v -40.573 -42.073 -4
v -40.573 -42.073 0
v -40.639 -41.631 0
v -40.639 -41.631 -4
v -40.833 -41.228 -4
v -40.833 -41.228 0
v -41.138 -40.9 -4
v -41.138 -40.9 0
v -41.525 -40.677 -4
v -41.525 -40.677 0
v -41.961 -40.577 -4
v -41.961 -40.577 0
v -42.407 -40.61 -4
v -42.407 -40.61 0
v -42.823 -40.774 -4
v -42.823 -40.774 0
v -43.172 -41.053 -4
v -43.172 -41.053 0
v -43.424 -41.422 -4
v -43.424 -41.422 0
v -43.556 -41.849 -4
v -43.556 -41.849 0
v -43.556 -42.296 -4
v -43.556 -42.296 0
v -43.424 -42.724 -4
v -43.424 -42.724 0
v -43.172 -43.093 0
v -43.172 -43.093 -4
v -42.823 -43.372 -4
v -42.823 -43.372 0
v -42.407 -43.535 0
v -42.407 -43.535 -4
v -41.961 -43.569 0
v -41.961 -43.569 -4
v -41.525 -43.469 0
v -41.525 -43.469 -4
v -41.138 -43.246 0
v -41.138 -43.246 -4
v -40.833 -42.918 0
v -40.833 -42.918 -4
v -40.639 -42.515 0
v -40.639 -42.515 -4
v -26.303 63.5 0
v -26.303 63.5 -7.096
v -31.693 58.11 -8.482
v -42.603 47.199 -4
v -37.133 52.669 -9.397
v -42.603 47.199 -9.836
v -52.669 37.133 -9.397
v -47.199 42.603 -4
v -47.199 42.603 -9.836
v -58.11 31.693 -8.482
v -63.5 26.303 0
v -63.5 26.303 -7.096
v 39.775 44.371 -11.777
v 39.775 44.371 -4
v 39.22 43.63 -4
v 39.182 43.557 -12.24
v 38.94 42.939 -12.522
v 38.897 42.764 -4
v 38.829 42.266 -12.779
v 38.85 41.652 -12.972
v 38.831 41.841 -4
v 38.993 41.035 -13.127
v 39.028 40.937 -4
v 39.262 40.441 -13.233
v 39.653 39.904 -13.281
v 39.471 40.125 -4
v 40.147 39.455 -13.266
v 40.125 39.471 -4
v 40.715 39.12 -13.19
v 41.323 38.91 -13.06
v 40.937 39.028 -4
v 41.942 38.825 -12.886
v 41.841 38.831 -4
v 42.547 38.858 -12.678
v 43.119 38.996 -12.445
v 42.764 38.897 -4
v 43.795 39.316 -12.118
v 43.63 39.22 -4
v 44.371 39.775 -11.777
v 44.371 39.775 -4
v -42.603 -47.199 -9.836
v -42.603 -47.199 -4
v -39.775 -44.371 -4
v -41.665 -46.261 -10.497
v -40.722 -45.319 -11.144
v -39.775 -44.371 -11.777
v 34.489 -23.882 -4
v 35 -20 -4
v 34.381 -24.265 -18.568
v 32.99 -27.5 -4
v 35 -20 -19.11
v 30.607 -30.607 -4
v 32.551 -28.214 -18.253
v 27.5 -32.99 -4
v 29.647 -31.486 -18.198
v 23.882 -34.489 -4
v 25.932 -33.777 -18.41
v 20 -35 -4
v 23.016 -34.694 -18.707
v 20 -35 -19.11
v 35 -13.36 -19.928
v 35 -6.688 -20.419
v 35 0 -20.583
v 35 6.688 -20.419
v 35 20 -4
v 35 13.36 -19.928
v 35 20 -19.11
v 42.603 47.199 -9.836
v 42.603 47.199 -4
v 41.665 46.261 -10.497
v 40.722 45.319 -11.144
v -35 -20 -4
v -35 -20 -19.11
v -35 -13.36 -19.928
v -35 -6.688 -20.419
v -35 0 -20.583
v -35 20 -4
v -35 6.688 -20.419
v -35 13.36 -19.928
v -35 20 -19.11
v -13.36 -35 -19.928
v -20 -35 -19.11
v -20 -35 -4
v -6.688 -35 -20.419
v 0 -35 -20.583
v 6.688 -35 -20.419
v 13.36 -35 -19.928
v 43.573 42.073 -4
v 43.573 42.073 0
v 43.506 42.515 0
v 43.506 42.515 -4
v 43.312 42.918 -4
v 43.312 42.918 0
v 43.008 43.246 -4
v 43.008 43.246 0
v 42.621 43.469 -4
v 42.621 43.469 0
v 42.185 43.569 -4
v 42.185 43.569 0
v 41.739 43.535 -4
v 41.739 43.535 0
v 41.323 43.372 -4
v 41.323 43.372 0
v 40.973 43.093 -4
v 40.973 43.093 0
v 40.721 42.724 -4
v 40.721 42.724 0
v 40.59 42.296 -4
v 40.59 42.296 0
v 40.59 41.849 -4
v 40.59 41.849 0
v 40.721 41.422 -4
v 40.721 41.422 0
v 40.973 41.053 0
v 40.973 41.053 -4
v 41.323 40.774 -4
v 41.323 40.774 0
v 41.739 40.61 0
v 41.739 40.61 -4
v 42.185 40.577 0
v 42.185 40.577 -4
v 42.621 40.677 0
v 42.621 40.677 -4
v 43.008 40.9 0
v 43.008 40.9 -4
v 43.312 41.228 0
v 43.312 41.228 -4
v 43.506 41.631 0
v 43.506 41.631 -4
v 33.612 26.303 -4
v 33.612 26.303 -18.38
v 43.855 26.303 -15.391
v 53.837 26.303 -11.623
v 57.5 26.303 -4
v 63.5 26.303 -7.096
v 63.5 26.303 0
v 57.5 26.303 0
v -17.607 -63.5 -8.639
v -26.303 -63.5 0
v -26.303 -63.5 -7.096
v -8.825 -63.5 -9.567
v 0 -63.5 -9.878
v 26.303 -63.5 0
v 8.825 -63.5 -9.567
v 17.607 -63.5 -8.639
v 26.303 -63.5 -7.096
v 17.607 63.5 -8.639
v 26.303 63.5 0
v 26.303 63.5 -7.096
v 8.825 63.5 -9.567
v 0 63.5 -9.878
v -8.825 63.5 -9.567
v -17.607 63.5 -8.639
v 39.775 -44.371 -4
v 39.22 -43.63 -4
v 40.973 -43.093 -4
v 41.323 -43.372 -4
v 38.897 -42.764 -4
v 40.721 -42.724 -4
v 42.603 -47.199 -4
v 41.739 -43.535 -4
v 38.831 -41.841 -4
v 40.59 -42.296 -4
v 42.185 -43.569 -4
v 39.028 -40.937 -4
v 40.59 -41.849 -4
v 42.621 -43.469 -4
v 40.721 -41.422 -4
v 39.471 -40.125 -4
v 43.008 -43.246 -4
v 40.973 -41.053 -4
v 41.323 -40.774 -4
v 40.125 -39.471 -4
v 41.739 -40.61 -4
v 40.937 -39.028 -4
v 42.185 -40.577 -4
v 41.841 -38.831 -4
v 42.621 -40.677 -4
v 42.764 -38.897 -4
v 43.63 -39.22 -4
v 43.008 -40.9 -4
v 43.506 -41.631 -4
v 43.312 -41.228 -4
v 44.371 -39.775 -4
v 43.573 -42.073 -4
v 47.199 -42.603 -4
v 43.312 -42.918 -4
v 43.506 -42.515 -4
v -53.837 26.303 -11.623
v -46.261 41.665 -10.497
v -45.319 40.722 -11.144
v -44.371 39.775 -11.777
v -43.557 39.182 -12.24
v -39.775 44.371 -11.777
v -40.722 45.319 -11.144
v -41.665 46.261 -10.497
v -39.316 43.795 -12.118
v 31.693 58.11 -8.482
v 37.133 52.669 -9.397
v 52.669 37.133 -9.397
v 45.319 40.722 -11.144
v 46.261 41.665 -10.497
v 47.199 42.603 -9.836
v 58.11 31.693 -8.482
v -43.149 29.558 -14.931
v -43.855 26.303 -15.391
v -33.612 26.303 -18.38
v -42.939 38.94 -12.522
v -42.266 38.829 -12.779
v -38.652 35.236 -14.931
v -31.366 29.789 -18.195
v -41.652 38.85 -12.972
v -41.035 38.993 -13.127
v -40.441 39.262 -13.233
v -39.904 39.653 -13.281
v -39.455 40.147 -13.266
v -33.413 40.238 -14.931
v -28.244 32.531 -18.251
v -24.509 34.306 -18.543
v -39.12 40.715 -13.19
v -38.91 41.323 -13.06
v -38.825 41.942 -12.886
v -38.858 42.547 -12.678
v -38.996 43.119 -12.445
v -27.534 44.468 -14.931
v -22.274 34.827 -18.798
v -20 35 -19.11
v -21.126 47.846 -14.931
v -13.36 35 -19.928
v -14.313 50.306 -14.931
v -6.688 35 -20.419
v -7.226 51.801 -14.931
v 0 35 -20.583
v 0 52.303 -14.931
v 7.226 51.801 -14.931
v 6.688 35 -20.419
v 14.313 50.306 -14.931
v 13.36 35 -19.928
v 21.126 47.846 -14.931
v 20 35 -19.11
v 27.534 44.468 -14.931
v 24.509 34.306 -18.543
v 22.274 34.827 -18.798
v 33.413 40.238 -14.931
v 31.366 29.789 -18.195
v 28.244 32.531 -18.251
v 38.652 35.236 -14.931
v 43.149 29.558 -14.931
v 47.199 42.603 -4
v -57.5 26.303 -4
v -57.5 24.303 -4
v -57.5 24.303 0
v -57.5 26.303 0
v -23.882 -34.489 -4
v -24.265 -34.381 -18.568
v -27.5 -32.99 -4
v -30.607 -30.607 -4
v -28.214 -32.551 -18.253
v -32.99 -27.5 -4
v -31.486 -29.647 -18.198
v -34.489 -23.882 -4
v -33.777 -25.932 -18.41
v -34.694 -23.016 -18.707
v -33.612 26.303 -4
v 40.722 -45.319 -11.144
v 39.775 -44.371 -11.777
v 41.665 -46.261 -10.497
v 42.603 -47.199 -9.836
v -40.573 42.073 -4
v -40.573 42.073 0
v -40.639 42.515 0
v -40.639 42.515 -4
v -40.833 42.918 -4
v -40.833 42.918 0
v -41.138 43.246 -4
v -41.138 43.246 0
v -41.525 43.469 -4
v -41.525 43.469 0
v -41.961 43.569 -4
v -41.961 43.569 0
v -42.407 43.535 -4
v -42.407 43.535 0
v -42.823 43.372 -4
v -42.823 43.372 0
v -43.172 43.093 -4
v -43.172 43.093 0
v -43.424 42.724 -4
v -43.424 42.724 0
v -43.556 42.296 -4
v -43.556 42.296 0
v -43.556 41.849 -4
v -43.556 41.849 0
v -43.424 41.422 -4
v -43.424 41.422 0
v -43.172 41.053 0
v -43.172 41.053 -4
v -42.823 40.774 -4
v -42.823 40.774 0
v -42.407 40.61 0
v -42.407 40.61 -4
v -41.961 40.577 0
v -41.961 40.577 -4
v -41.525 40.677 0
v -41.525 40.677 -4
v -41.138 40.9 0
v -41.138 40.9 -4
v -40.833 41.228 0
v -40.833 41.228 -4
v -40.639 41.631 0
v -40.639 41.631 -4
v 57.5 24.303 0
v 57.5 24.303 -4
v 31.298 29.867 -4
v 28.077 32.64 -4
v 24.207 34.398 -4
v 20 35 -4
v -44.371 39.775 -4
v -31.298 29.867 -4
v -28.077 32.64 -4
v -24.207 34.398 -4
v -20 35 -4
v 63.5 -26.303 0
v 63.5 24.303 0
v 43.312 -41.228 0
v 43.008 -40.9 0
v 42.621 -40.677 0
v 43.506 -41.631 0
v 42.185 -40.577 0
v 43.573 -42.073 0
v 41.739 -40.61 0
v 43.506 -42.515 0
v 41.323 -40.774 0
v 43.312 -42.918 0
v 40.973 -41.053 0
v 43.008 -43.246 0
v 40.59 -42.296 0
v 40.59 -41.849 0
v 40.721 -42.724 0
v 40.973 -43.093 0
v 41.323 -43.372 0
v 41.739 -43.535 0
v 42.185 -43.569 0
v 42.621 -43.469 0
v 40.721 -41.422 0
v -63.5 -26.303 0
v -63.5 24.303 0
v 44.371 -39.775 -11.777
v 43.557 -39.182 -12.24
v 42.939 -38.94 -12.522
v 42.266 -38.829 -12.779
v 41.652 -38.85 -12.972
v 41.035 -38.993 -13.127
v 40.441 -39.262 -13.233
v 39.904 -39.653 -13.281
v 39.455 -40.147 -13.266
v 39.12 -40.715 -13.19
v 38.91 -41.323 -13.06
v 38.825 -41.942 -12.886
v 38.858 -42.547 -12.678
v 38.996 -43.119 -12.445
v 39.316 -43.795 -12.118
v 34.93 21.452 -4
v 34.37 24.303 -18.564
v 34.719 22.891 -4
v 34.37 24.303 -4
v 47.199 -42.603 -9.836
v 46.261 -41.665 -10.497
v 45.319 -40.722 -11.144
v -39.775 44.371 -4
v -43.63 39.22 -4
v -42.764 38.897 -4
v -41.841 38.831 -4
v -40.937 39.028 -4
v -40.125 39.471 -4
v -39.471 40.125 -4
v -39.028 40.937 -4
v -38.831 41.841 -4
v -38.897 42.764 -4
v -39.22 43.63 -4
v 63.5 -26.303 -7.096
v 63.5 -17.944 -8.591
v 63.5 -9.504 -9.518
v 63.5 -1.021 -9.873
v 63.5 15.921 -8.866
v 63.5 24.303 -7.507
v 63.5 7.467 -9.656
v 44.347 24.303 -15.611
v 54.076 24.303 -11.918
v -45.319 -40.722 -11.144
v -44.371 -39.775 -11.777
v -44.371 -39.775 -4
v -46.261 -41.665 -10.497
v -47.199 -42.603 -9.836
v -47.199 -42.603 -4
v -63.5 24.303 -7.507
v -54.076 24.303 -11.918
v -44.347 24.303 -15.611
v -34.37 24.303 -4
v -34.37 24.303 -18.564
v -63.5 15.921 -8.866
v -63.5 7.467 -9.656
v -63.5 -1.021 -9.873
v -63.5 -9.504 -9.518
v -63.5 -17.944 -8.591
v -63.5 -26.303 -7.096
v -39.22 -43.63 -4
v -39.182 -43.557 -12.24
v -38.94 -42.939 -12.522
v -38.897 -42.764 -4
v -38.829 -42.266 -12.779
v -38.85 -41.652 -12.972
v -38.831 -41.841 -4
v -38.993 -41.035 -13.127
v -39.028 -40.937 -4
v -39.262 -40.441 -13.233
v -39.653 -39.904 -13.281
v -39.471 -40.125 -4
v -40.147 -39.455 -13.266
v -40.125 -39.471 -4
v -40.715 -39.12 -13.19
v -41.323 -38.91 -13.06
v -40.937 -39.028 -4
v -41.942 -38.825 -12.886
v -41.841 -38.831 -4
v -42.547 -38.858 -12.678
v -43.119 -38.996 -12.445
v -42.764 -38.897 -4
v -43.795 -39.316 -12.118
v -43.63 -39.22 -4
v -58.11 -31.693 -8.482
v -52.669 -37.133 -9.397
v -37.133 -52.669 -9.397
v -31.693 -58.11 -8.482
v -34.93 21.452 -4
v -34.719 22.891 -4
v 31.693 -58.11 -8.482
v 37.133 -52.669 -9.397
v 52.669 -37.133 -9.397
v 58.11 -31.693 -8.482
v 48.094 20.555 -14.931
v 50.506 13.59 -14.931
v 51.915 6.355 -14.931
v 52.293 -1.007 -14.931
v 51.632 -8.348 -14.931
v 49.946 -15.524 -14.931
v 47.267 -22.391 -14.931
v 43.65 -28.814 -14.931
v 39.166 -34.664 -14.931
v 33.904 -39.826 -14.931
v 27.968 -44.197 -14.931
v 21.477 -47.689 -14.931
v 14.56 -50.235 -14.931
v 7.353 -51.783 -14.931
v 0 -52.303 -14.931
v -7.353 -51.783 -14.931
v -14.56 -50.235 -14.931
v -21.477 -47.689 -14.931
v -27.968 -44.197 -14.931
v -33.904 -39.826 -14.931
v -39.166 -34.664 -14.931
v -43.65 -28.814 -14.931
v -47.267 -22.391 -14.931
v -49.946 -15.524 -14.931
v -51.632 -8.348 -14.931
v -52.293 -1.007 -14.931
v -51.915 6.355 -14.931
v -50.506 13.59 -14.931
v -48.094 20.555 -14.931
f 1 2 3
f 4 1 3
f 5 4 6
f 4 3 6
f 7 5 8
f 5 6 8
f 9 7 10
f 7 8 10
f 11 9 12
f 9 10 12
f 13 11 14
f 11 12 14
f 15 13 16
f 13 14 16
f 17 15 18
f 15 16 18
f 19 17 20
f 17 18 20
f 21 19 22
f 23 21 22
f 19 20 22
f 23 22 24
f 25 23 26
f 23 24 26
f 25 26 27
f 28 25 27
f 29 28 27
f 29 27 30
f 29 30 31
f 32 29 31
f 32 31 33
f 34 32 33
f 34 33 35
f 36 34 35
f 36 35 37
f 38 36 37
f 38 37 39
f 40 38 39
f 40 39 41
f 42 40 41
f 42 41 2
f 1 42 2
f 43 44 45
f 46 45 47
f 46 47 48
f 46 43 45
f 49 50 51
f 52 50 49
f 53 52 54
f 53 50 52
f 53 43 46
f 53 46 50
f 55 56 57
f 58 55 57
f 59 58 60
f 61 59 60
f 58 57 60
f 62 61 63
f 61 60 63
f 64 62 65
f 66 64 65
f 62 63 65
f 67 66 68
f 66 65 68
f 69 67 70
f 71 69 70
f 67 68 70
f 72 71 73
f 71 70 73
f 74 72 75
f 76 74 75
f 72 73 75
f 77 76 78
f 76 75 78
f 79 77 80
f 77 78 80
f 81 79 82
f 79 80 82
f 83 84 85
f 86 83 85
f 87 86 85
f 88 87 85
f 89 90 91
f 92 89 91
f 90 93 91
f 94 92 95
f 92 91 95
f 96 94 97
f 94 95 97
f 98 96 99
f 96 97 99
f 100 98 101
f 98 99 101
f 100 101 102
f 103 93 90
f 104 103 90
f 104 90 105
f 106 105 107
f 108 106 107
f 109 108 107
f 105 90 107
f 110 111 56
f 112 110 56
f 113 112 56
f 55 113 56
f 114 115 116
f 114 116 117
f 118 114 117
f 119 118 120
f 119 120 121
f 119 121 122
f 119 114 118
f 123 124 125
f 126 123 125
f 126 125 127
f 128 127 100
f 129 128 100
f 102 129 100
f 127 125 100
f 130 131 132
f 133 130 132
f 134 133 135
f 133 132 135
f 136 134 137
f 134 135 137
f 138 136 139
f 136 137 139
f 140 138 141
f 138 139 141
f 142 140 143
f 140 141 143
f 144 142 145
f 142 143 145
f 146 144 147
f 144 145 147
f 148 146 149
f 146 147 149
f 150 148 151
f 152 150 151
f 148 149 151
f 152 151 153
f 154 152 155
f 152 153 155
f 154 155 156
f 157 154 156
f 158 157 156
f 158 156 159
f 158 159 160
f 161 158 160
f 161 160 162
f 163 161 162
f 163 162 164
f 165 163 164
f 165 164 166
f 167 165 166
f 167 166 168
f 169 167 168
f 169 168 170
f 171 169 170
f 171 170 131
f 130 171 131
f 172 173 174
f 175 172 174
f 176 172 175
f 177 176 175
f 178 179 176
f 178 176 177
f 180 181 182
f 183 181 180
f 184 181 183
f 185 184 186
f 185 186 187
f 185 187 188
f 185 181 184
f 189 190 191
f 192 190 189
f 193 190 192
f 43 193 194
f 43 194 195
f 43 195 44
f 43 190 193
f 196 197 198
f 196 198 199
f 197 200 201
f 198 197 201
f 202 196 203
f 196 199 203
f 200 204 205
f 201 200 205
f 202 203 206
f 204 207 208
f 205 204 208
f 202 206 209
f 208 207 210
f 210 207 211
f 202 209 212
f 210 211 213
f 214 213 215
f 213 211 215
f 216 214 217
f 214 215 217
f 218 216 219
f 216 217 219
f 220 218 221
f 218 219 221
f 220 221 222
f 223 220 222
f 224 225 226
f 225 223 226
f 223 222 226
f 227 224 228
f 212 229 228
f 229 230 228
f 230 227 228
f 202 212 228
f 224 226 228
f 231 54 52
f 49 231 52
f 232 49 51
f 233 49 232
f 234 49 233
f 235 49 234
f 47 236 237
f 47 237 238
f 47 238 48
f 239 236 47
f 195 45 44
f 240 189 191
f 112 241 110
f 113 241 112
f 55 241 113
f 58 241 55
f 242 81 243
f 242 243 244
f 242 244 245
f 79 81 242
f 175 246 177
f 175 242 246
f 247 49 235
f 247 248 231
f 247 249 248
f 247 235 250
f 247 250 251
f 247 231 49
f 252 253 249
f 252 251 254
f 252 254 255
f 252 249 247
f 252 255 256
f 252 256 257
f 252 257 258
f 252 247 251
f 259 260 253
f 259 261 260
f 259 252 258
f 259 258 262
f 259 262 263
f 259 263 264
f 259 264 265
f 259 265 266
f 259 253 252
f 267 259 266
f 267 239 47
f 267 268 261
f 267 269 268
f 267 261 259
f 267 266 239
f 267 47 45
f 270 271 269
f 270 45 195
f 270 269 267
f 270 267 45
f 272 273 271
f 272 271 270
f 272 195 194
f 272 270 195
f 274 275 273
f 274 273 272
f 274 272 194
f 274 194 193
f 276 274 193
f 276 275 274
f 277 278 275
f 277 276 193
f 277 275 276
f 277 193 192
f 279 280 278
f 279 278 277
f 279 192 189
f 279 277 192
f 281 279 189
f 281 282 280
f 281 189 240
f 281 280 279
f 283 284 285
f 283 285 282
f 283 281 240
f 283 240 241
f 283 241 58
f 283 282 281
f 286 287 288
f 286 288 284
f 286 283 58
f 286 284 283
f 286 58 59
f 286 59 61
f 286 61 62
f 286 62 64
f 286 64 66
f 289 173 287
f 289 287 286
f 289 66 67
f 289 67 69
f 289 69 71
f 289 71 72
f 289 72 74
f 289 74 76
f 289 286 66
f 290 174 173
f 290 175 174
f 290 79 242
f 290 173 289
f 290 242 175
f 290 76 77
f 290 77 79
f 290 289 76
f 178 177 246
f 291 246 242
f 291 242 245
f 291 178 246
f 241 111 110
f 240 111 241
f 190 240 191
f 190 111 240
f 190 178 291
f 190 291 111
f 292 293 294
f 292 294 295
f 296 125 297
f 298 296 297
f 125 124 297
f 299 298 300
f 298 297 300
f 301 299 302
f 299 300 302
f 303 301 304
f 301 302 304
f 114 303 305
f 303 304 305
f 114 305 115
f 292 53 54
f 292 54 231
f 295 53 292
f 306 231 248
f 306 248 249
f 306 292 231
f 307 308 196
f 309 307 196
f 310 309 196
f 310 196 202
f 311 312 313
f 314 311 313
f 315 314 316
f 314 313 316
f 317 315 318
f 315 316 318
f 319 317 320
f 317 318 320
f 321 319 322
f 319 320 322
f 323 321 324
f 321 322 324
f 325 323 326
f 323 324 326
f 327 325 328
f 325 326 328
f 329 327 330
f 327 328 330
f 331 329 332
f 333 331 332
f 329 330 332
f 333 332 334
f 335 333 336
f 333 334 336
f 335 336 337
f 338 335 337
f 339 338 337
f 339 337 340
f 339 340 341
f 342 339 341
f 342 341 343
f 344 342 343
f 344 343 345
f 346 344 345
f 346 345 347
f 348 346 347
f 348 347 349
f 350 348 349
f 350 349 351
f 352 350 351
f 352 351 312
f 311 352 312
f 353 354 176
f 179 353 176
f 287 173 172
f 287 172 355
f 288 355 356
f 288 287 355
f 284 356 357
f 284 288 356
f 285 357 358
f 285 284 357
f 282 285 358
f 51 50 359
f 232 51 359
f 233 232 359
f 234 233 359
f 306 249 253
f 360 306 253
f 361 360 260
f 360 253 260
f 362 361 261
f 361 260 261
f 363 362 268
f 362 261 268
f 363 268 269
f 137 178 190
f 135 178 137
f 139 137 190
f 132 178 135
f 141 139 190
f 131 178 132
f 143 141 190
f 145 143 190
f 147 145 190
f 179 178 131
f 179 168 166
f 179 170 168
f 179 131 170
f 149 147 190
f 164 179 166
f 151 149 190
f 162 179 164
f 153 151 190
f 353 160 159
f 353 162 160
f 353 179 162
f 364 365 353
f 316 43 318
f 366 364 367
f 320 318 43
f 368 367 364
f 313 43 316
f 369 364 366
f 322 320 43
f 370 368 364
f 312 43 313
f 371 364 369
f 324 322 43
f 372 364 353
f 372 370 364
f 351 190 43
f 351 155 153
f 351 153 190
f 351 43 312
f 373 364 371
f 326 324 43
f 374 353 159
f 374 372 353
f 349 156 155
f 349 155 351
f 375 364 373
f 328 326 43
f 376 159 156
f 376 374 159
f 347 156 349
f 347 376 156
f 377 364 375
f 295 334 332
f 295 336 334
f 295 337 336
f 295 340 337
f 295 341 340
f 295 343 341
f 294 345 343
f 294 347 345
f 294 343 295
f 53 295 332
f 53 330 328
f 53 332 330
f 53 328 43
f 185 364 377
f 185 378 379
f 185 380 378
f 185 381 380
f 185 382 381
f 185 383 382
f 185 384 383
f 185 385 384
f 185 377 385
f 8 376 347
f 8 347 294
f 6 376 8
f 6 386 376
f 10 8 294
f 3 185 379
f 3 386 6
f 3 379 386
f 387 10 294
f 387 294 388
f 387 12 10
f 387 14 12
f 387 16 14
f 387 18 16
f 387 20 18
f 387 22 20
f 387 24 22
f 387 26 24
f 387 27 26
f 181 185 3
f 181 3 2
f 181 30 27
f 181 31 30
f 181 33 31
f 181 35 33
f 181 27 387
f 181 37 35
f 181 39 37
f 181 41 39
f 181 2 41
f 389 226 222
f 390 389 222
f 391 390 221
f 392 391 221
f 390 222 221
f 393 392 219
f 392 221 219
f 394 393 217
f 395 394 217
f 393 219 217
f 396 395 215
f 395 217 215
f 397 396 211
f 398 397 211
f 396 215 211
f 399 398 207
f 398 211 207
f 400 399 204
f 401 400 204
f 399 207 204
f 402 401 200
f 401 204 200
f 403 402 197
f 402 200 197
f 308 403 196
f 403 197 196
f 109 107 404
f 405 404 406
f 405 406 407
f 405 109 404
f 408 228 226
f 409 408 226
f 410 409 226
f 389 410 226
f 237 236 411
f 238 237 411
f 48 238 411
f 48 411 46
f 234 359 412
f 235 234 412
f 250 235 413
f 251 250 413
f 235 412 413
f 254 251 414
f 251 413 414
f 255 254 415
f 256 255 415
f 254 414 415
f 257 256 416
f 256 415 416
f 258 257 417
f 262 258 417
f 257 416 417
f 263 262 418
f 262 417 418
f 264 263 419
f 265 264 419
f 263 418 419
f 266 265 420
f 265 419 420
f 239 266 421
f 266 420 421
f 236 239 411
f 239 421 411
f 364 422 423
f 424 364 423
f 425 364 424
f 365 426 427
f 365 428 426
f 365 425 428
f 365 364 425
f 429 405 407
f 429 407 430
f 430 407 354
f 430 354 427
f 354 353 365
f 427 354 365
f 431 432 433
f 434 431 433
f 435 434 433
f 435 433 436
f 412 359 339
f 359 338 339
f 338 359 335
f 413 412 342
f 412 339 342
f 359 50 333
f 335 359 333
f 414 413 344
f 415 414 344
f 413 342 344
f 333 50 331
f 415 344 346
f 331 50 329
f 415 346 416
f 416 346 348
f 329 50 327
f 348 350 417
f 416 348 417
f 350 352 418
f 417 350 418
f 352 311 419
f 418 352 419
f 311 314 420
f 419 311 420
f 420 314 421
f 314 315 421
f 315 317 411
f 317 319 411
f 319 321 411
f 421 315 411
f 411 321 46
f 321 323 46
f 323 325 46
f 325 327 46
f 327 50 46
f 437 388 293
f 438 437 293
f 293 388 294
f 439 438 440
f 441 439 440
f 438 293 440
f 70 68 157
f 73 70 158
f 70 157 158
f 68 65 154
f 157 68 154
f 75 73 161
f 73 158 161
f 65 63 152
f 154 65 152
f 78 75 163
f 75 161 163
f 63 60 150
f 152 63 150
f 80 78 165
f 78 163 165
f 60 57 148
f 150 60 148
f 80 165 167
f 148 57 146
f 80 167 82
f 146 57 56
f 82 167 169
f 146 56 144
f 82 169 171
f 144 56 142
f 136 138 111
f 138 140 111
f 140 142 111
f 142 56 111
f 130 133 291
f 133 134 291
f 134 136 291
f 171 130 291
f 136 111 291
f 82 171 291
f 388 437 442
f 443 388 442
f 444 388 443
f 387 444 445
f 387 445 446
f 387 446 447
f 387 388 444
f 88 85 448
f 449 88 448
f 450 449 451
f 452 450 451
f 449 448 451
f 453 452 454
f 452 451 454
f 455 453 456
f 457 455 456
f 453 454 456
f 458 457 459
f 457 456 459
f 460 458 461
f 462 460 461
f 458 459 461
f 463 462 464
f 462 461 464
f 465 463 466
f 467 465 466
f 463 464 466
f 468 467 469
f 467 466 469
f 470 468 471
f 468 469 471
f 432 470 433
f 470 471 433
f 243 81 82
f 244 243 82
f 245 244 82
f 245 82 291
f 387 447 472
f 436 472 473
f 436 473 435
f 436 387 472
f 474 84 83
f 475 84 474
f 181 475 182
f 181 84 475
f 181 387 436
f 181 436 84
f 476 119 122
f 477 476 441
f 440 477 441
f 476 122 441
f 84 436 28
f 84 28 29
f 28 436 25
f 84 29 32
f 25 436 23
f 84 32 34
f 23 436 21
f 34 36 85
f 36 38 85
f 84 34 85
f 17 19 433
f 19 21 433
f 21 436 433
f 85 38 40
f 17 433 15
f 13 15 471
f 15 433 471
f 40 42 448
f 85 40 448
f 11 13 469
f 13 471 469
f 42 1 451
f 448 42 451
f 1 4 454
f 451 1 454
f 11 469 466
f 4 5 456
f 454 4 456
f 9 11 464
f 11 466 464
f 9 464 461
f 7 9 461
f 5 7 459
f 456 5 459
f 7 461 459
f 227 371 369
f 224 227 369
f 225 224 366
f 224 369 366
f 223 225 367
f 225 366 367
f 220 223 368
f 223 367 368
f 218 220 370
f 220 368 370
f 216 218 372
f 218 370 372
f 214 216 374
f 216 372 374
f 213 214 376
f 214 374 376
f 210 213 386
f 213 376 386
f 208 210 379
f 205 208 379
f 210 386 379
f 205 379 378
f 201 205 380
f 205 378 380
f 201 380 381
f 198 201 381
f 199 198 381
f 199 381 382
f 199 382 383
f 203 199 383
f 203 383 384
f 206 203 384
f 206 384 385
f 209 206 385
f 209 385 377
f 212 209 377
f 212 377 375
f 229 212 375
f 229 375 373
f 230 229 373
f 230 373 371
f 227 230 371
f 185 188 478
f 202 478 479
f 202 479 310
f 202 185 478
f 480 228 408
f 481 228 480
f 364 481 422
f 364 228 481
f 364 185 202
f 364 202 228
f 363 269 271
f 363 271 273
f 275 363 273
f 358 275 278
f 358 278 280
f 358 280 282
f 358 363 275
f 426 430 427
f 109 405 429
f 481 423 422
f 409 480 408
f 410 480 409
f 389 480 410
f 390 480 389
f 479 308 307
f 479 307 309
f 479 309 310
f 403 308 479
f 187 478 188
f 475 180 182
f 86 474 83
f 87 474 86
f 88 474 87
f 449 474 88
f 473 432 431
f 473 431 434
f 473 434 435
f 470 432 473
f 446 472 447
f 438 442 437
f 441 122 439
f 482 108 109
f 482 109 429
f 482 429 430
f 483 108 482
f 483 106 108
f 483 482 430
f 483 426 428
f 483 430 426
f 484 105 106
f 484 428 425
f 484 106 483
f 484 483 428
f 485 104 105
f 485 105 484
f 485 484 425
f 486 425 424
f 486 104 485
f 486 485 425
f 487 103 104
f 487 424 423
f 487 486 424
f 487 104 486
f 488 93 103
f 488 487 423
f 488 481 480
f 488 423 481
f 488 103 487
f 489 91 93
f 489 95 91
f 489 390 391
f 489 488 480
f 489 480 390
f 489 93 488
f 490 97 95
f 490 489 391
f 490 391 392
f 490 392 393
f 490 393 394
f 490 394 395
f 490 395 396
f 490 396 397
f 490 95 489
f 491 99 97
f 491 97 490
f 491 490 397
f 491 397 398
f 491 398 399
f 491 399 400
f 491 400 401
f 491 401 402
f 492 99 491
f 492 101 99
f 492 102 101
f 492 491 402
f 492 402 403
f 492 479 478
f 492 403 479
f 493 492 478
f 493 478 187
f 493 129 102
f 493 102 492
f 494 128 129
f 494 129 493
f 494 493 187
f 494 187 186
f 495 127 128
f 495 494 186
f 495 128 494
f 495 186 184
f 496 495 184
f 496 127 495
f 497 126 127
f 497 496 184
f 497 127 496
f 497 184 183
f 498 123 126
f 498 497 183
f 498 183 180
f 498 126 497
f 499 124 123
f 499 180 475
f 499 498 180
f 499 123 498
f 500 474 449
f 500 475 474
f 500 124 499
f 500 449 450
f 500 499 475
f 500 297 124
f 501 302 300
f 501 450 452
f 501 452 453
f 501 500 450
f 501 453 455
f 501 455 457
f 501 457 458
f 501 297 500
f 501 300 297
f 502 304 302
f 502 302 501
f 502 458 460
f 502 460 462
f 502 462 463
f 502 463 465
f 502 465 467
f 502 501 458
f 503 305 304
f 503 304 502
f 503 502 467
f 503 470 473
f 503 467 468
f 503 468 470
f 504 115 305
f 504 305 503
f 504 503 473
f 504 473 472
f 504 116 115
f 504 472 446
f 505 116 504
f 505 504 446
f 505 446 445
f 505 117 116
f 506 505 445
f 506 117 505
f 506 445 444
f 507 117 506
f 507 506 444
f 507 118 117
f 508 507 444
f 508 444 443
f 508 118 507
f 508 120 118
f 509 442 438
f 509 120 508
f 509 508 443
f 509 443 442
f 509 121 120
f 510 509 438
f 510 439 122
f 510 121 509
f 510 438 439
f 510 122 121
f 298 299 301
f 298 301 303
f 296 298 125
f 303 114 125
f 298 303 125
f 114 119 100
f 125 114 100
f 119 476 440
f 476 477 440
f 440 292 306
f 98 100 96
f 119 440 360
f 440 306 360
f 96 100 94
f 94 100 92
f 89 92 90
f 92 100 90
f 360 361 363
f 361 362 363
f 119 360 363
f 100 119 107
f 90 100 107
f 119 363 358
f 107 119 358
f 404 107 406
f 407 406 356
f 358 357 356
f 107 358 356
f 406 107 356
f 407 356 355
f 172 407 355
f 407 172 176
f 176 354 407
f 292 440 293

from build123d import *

# Parameters (mm, degrees)
ESBO_O1_OUTSIDE_W     = 192.158
ESBO_O1_OUTSIDE_H     = 192.158
CORTE_EXTRUS_O1_DEPTH = 108.596468344
CORTE_EXTRUS_O2_START = -4
ESBO_O3_W             = 70
ESBO_O3_H             = 70
CORTE_EXTRUS_O2_DEPTH = 90.21748763
FILETE1_R             = 15
ESBO_O4_W             = 127
ESBO_O4_H             = 2
CORTE_EXTRUS_O4_DEPTH = 92.320862119
ESBO_O5_W             = 6
ESBO_O5_H             = 2
CORTE_EXTRUS_O5_DEPTH = 92.320862119
ESBO_O6_R             = 1.5
CORTE_EXTRUS_O7_DEPTH = 93.131236882
CORTE_EXTRUS_O8_START = -4
CORTE_EXTRUS_O8_DEPTH = 89.131236882


with BuildPart() as part:
    # Esboço2 → Revolução1 (revolve)
    with BuildSketch(Plane(origin=(0, 0, 0), x_dir=(0, 0, -1), z_dir=(1, 0, 0)), mode=Mode.PRIVATE) as revolu_o1_sk:
        with BuildLine():
            Line((0, 74), (4, 74))
            ThreePointArc((4, 74), (19.648353468, 38.461019227), (25, 0))
            Line((25, 0), (0, 0))
            Line((0, 0), (0, 74))
        make_face()
    revolve(revolu_o1_sk.sketch.rotate(Axis((0, 0, 0), (0, 0, -1)), 90), axis=Axis((0, 0, 0), (0, 0, -1)))

    # Esboço1 outside → Corte-extrusão1 (cut, through all)
    with BuildSketch(Plane.XY):
        Rectangle(ESBO_O1_OUTSIDE_W, ESBO_O1_OUTSIDE_H)
        Polygon((63.5, 26.302561211), (26.302561211, 63.5), (-26.302561211, 63.5), (-63.5, 26.302561211), (-63.5, -26.302561211), (-26.302561211, -63.5), (26.302561211, -63.5), (63.5, -26.302561211), align=None, mode=Mode.SUBTRACT)
    extrude(amount=-CORTE_EXTRUS_O1_DEPTH, mode=Mode.SUBTRACT)

    # Esboço3 → Corte-extrusão2 (cut, through all)
    with BuildSketch(Plane.XY.offset(CORTE_EXTRUS_O2_START)):
        Rectangle(ESBO_O3_W, ESBO_O3_H)
    extrude(amount=-CORTE_EXTRUS_O2_DEPTH, mode=Mode.SUBTRACT)

    # Filete1
    filete1_edges = [part.edges().sort_by_distance(p)[0] for p in [
        (35, 35, -10.009206795),
        (35, -35, -10.009206795),
        (-35, -35, -10.009206795),
        (-35, 35, -10.009206795),
    ]]
    fillet(filete1_edges, radius=FILETE1_R)

    # Esboço4 → Corte-extrusão4 (cut, through all)
    with BuildSketch(Plane.XY.offset(-4)):
        with Locations((0, 25.302561211)):
            Rectangle(ESBO_O4_W, ESBO_O4_H)
    extrude(amount=-CORTE_EXTRUS_O4_DEPTH, mode=Mode.SUBTRACT)

    # Esboço5 → Corte-extrusão5 (cut, through all)
    with BuildSketch(Plane(origin=(0, 0, -4), x_dir=(-1, 0, 0), z_dir=(0, 0, -1))):
        with Locations((-60.5, 25.302561211)):
            Rectangle(ESBO_O5_W, ESBO_O5_H)
        with Locations((60.5, 25.302561211)):
            Rectangle(ESBO_O5_W, ESBO_O5_H)
    extrude(amount=-CORTE_EXTRUS_O5_DEPTH, mode=Mode.SUBTRACT)

    # Esboço6 → Corte-extrusão7 (cut, through all)
    with BuildSketch(Plane.XY):
        with Locations((42.072853481, -42.072853481)):
            Circle(ESBO_O6_R)
        with Locations((-42.072853481, -42.072853481)):
            Circle(ESBO_O6_R)
        with Locations((-42.072853481, 42.072853481)):
            Circle(ESBO_O6_R)
        with Locations((42.072853481, 42.072853481)):
            Circle(ESBO_O6_R)
    extrude(amount=-CORTE_EXTRUS_O7_DEPTH, mode=Mode.SUBTRACT)

    # Esboço7 → Corte-extrusão8 (cut, through all)
    with BuildSketch(Plane.XY.offset(CORTE_EXTRUS_O8_START)):
        with BuildLine():
            Line((42.603183566, 47.199377644), (39.774756442, 44.370950519))
            ThreePointArc((39.774756442, 44.370950519), (39.774756442, 39.774756442), (44.370950519, 39.774756442))
            Line((44.370950519, 39.774756442), (47.199377644, 42.603183566))
            Line((47.199377644, 42.603183566), (42.603183566, 47.199377644))
        make_face()
        with BuildLine():
            Line((-47.199377644, 42.603183566), (-44.370950519, 39.774756442))
            ThreePointArc((-44.370950519, 39.774756442), (-39.774756442, 39.774756442), (-39.774756442, 44.370950519))
            Line((-39.774756442, 44.370950519), (-42.603183566, 47.199377644))
            Line((-42.603183566, 47.199377644), (-47.199377644, 42.603183566))
        make_face()
        with BuildLine():
            Line((47.199377644, -42.603183566), (44.370950519, -39.774756442))
            ThreePointArc((44.370950519, -39.774756442), (39.774756442, -39.774756442), (39.774756442, -44.370950519))
            Line((39.774756442, -44.370950519), (42.603183566, -47.199377644))
            Line((42.603183566, -47.199377644), (47.199377644, -42.603183566))
        make_face()
        with BuildLine():
            Line((-42.603183566, -47.199377644), (-39.774756442, -44.370950519))
            ThreePointArc((-39.774756442, -44.370950519), (-39.774756442, -39.774756442), (-44.370950519, -39.774756442))
            Line((-44.370950519, -39.774756442), (-47.199377644, -42.603183566))
            Line((-47.199377644, -42.603183566), (-42.603183566, -47.199377644))
        make_face()
    extrude(amount=-CORTE_EXTRUS_O8_DEPTH, mode=Mode.SUBTRACT)


solid = part.part
